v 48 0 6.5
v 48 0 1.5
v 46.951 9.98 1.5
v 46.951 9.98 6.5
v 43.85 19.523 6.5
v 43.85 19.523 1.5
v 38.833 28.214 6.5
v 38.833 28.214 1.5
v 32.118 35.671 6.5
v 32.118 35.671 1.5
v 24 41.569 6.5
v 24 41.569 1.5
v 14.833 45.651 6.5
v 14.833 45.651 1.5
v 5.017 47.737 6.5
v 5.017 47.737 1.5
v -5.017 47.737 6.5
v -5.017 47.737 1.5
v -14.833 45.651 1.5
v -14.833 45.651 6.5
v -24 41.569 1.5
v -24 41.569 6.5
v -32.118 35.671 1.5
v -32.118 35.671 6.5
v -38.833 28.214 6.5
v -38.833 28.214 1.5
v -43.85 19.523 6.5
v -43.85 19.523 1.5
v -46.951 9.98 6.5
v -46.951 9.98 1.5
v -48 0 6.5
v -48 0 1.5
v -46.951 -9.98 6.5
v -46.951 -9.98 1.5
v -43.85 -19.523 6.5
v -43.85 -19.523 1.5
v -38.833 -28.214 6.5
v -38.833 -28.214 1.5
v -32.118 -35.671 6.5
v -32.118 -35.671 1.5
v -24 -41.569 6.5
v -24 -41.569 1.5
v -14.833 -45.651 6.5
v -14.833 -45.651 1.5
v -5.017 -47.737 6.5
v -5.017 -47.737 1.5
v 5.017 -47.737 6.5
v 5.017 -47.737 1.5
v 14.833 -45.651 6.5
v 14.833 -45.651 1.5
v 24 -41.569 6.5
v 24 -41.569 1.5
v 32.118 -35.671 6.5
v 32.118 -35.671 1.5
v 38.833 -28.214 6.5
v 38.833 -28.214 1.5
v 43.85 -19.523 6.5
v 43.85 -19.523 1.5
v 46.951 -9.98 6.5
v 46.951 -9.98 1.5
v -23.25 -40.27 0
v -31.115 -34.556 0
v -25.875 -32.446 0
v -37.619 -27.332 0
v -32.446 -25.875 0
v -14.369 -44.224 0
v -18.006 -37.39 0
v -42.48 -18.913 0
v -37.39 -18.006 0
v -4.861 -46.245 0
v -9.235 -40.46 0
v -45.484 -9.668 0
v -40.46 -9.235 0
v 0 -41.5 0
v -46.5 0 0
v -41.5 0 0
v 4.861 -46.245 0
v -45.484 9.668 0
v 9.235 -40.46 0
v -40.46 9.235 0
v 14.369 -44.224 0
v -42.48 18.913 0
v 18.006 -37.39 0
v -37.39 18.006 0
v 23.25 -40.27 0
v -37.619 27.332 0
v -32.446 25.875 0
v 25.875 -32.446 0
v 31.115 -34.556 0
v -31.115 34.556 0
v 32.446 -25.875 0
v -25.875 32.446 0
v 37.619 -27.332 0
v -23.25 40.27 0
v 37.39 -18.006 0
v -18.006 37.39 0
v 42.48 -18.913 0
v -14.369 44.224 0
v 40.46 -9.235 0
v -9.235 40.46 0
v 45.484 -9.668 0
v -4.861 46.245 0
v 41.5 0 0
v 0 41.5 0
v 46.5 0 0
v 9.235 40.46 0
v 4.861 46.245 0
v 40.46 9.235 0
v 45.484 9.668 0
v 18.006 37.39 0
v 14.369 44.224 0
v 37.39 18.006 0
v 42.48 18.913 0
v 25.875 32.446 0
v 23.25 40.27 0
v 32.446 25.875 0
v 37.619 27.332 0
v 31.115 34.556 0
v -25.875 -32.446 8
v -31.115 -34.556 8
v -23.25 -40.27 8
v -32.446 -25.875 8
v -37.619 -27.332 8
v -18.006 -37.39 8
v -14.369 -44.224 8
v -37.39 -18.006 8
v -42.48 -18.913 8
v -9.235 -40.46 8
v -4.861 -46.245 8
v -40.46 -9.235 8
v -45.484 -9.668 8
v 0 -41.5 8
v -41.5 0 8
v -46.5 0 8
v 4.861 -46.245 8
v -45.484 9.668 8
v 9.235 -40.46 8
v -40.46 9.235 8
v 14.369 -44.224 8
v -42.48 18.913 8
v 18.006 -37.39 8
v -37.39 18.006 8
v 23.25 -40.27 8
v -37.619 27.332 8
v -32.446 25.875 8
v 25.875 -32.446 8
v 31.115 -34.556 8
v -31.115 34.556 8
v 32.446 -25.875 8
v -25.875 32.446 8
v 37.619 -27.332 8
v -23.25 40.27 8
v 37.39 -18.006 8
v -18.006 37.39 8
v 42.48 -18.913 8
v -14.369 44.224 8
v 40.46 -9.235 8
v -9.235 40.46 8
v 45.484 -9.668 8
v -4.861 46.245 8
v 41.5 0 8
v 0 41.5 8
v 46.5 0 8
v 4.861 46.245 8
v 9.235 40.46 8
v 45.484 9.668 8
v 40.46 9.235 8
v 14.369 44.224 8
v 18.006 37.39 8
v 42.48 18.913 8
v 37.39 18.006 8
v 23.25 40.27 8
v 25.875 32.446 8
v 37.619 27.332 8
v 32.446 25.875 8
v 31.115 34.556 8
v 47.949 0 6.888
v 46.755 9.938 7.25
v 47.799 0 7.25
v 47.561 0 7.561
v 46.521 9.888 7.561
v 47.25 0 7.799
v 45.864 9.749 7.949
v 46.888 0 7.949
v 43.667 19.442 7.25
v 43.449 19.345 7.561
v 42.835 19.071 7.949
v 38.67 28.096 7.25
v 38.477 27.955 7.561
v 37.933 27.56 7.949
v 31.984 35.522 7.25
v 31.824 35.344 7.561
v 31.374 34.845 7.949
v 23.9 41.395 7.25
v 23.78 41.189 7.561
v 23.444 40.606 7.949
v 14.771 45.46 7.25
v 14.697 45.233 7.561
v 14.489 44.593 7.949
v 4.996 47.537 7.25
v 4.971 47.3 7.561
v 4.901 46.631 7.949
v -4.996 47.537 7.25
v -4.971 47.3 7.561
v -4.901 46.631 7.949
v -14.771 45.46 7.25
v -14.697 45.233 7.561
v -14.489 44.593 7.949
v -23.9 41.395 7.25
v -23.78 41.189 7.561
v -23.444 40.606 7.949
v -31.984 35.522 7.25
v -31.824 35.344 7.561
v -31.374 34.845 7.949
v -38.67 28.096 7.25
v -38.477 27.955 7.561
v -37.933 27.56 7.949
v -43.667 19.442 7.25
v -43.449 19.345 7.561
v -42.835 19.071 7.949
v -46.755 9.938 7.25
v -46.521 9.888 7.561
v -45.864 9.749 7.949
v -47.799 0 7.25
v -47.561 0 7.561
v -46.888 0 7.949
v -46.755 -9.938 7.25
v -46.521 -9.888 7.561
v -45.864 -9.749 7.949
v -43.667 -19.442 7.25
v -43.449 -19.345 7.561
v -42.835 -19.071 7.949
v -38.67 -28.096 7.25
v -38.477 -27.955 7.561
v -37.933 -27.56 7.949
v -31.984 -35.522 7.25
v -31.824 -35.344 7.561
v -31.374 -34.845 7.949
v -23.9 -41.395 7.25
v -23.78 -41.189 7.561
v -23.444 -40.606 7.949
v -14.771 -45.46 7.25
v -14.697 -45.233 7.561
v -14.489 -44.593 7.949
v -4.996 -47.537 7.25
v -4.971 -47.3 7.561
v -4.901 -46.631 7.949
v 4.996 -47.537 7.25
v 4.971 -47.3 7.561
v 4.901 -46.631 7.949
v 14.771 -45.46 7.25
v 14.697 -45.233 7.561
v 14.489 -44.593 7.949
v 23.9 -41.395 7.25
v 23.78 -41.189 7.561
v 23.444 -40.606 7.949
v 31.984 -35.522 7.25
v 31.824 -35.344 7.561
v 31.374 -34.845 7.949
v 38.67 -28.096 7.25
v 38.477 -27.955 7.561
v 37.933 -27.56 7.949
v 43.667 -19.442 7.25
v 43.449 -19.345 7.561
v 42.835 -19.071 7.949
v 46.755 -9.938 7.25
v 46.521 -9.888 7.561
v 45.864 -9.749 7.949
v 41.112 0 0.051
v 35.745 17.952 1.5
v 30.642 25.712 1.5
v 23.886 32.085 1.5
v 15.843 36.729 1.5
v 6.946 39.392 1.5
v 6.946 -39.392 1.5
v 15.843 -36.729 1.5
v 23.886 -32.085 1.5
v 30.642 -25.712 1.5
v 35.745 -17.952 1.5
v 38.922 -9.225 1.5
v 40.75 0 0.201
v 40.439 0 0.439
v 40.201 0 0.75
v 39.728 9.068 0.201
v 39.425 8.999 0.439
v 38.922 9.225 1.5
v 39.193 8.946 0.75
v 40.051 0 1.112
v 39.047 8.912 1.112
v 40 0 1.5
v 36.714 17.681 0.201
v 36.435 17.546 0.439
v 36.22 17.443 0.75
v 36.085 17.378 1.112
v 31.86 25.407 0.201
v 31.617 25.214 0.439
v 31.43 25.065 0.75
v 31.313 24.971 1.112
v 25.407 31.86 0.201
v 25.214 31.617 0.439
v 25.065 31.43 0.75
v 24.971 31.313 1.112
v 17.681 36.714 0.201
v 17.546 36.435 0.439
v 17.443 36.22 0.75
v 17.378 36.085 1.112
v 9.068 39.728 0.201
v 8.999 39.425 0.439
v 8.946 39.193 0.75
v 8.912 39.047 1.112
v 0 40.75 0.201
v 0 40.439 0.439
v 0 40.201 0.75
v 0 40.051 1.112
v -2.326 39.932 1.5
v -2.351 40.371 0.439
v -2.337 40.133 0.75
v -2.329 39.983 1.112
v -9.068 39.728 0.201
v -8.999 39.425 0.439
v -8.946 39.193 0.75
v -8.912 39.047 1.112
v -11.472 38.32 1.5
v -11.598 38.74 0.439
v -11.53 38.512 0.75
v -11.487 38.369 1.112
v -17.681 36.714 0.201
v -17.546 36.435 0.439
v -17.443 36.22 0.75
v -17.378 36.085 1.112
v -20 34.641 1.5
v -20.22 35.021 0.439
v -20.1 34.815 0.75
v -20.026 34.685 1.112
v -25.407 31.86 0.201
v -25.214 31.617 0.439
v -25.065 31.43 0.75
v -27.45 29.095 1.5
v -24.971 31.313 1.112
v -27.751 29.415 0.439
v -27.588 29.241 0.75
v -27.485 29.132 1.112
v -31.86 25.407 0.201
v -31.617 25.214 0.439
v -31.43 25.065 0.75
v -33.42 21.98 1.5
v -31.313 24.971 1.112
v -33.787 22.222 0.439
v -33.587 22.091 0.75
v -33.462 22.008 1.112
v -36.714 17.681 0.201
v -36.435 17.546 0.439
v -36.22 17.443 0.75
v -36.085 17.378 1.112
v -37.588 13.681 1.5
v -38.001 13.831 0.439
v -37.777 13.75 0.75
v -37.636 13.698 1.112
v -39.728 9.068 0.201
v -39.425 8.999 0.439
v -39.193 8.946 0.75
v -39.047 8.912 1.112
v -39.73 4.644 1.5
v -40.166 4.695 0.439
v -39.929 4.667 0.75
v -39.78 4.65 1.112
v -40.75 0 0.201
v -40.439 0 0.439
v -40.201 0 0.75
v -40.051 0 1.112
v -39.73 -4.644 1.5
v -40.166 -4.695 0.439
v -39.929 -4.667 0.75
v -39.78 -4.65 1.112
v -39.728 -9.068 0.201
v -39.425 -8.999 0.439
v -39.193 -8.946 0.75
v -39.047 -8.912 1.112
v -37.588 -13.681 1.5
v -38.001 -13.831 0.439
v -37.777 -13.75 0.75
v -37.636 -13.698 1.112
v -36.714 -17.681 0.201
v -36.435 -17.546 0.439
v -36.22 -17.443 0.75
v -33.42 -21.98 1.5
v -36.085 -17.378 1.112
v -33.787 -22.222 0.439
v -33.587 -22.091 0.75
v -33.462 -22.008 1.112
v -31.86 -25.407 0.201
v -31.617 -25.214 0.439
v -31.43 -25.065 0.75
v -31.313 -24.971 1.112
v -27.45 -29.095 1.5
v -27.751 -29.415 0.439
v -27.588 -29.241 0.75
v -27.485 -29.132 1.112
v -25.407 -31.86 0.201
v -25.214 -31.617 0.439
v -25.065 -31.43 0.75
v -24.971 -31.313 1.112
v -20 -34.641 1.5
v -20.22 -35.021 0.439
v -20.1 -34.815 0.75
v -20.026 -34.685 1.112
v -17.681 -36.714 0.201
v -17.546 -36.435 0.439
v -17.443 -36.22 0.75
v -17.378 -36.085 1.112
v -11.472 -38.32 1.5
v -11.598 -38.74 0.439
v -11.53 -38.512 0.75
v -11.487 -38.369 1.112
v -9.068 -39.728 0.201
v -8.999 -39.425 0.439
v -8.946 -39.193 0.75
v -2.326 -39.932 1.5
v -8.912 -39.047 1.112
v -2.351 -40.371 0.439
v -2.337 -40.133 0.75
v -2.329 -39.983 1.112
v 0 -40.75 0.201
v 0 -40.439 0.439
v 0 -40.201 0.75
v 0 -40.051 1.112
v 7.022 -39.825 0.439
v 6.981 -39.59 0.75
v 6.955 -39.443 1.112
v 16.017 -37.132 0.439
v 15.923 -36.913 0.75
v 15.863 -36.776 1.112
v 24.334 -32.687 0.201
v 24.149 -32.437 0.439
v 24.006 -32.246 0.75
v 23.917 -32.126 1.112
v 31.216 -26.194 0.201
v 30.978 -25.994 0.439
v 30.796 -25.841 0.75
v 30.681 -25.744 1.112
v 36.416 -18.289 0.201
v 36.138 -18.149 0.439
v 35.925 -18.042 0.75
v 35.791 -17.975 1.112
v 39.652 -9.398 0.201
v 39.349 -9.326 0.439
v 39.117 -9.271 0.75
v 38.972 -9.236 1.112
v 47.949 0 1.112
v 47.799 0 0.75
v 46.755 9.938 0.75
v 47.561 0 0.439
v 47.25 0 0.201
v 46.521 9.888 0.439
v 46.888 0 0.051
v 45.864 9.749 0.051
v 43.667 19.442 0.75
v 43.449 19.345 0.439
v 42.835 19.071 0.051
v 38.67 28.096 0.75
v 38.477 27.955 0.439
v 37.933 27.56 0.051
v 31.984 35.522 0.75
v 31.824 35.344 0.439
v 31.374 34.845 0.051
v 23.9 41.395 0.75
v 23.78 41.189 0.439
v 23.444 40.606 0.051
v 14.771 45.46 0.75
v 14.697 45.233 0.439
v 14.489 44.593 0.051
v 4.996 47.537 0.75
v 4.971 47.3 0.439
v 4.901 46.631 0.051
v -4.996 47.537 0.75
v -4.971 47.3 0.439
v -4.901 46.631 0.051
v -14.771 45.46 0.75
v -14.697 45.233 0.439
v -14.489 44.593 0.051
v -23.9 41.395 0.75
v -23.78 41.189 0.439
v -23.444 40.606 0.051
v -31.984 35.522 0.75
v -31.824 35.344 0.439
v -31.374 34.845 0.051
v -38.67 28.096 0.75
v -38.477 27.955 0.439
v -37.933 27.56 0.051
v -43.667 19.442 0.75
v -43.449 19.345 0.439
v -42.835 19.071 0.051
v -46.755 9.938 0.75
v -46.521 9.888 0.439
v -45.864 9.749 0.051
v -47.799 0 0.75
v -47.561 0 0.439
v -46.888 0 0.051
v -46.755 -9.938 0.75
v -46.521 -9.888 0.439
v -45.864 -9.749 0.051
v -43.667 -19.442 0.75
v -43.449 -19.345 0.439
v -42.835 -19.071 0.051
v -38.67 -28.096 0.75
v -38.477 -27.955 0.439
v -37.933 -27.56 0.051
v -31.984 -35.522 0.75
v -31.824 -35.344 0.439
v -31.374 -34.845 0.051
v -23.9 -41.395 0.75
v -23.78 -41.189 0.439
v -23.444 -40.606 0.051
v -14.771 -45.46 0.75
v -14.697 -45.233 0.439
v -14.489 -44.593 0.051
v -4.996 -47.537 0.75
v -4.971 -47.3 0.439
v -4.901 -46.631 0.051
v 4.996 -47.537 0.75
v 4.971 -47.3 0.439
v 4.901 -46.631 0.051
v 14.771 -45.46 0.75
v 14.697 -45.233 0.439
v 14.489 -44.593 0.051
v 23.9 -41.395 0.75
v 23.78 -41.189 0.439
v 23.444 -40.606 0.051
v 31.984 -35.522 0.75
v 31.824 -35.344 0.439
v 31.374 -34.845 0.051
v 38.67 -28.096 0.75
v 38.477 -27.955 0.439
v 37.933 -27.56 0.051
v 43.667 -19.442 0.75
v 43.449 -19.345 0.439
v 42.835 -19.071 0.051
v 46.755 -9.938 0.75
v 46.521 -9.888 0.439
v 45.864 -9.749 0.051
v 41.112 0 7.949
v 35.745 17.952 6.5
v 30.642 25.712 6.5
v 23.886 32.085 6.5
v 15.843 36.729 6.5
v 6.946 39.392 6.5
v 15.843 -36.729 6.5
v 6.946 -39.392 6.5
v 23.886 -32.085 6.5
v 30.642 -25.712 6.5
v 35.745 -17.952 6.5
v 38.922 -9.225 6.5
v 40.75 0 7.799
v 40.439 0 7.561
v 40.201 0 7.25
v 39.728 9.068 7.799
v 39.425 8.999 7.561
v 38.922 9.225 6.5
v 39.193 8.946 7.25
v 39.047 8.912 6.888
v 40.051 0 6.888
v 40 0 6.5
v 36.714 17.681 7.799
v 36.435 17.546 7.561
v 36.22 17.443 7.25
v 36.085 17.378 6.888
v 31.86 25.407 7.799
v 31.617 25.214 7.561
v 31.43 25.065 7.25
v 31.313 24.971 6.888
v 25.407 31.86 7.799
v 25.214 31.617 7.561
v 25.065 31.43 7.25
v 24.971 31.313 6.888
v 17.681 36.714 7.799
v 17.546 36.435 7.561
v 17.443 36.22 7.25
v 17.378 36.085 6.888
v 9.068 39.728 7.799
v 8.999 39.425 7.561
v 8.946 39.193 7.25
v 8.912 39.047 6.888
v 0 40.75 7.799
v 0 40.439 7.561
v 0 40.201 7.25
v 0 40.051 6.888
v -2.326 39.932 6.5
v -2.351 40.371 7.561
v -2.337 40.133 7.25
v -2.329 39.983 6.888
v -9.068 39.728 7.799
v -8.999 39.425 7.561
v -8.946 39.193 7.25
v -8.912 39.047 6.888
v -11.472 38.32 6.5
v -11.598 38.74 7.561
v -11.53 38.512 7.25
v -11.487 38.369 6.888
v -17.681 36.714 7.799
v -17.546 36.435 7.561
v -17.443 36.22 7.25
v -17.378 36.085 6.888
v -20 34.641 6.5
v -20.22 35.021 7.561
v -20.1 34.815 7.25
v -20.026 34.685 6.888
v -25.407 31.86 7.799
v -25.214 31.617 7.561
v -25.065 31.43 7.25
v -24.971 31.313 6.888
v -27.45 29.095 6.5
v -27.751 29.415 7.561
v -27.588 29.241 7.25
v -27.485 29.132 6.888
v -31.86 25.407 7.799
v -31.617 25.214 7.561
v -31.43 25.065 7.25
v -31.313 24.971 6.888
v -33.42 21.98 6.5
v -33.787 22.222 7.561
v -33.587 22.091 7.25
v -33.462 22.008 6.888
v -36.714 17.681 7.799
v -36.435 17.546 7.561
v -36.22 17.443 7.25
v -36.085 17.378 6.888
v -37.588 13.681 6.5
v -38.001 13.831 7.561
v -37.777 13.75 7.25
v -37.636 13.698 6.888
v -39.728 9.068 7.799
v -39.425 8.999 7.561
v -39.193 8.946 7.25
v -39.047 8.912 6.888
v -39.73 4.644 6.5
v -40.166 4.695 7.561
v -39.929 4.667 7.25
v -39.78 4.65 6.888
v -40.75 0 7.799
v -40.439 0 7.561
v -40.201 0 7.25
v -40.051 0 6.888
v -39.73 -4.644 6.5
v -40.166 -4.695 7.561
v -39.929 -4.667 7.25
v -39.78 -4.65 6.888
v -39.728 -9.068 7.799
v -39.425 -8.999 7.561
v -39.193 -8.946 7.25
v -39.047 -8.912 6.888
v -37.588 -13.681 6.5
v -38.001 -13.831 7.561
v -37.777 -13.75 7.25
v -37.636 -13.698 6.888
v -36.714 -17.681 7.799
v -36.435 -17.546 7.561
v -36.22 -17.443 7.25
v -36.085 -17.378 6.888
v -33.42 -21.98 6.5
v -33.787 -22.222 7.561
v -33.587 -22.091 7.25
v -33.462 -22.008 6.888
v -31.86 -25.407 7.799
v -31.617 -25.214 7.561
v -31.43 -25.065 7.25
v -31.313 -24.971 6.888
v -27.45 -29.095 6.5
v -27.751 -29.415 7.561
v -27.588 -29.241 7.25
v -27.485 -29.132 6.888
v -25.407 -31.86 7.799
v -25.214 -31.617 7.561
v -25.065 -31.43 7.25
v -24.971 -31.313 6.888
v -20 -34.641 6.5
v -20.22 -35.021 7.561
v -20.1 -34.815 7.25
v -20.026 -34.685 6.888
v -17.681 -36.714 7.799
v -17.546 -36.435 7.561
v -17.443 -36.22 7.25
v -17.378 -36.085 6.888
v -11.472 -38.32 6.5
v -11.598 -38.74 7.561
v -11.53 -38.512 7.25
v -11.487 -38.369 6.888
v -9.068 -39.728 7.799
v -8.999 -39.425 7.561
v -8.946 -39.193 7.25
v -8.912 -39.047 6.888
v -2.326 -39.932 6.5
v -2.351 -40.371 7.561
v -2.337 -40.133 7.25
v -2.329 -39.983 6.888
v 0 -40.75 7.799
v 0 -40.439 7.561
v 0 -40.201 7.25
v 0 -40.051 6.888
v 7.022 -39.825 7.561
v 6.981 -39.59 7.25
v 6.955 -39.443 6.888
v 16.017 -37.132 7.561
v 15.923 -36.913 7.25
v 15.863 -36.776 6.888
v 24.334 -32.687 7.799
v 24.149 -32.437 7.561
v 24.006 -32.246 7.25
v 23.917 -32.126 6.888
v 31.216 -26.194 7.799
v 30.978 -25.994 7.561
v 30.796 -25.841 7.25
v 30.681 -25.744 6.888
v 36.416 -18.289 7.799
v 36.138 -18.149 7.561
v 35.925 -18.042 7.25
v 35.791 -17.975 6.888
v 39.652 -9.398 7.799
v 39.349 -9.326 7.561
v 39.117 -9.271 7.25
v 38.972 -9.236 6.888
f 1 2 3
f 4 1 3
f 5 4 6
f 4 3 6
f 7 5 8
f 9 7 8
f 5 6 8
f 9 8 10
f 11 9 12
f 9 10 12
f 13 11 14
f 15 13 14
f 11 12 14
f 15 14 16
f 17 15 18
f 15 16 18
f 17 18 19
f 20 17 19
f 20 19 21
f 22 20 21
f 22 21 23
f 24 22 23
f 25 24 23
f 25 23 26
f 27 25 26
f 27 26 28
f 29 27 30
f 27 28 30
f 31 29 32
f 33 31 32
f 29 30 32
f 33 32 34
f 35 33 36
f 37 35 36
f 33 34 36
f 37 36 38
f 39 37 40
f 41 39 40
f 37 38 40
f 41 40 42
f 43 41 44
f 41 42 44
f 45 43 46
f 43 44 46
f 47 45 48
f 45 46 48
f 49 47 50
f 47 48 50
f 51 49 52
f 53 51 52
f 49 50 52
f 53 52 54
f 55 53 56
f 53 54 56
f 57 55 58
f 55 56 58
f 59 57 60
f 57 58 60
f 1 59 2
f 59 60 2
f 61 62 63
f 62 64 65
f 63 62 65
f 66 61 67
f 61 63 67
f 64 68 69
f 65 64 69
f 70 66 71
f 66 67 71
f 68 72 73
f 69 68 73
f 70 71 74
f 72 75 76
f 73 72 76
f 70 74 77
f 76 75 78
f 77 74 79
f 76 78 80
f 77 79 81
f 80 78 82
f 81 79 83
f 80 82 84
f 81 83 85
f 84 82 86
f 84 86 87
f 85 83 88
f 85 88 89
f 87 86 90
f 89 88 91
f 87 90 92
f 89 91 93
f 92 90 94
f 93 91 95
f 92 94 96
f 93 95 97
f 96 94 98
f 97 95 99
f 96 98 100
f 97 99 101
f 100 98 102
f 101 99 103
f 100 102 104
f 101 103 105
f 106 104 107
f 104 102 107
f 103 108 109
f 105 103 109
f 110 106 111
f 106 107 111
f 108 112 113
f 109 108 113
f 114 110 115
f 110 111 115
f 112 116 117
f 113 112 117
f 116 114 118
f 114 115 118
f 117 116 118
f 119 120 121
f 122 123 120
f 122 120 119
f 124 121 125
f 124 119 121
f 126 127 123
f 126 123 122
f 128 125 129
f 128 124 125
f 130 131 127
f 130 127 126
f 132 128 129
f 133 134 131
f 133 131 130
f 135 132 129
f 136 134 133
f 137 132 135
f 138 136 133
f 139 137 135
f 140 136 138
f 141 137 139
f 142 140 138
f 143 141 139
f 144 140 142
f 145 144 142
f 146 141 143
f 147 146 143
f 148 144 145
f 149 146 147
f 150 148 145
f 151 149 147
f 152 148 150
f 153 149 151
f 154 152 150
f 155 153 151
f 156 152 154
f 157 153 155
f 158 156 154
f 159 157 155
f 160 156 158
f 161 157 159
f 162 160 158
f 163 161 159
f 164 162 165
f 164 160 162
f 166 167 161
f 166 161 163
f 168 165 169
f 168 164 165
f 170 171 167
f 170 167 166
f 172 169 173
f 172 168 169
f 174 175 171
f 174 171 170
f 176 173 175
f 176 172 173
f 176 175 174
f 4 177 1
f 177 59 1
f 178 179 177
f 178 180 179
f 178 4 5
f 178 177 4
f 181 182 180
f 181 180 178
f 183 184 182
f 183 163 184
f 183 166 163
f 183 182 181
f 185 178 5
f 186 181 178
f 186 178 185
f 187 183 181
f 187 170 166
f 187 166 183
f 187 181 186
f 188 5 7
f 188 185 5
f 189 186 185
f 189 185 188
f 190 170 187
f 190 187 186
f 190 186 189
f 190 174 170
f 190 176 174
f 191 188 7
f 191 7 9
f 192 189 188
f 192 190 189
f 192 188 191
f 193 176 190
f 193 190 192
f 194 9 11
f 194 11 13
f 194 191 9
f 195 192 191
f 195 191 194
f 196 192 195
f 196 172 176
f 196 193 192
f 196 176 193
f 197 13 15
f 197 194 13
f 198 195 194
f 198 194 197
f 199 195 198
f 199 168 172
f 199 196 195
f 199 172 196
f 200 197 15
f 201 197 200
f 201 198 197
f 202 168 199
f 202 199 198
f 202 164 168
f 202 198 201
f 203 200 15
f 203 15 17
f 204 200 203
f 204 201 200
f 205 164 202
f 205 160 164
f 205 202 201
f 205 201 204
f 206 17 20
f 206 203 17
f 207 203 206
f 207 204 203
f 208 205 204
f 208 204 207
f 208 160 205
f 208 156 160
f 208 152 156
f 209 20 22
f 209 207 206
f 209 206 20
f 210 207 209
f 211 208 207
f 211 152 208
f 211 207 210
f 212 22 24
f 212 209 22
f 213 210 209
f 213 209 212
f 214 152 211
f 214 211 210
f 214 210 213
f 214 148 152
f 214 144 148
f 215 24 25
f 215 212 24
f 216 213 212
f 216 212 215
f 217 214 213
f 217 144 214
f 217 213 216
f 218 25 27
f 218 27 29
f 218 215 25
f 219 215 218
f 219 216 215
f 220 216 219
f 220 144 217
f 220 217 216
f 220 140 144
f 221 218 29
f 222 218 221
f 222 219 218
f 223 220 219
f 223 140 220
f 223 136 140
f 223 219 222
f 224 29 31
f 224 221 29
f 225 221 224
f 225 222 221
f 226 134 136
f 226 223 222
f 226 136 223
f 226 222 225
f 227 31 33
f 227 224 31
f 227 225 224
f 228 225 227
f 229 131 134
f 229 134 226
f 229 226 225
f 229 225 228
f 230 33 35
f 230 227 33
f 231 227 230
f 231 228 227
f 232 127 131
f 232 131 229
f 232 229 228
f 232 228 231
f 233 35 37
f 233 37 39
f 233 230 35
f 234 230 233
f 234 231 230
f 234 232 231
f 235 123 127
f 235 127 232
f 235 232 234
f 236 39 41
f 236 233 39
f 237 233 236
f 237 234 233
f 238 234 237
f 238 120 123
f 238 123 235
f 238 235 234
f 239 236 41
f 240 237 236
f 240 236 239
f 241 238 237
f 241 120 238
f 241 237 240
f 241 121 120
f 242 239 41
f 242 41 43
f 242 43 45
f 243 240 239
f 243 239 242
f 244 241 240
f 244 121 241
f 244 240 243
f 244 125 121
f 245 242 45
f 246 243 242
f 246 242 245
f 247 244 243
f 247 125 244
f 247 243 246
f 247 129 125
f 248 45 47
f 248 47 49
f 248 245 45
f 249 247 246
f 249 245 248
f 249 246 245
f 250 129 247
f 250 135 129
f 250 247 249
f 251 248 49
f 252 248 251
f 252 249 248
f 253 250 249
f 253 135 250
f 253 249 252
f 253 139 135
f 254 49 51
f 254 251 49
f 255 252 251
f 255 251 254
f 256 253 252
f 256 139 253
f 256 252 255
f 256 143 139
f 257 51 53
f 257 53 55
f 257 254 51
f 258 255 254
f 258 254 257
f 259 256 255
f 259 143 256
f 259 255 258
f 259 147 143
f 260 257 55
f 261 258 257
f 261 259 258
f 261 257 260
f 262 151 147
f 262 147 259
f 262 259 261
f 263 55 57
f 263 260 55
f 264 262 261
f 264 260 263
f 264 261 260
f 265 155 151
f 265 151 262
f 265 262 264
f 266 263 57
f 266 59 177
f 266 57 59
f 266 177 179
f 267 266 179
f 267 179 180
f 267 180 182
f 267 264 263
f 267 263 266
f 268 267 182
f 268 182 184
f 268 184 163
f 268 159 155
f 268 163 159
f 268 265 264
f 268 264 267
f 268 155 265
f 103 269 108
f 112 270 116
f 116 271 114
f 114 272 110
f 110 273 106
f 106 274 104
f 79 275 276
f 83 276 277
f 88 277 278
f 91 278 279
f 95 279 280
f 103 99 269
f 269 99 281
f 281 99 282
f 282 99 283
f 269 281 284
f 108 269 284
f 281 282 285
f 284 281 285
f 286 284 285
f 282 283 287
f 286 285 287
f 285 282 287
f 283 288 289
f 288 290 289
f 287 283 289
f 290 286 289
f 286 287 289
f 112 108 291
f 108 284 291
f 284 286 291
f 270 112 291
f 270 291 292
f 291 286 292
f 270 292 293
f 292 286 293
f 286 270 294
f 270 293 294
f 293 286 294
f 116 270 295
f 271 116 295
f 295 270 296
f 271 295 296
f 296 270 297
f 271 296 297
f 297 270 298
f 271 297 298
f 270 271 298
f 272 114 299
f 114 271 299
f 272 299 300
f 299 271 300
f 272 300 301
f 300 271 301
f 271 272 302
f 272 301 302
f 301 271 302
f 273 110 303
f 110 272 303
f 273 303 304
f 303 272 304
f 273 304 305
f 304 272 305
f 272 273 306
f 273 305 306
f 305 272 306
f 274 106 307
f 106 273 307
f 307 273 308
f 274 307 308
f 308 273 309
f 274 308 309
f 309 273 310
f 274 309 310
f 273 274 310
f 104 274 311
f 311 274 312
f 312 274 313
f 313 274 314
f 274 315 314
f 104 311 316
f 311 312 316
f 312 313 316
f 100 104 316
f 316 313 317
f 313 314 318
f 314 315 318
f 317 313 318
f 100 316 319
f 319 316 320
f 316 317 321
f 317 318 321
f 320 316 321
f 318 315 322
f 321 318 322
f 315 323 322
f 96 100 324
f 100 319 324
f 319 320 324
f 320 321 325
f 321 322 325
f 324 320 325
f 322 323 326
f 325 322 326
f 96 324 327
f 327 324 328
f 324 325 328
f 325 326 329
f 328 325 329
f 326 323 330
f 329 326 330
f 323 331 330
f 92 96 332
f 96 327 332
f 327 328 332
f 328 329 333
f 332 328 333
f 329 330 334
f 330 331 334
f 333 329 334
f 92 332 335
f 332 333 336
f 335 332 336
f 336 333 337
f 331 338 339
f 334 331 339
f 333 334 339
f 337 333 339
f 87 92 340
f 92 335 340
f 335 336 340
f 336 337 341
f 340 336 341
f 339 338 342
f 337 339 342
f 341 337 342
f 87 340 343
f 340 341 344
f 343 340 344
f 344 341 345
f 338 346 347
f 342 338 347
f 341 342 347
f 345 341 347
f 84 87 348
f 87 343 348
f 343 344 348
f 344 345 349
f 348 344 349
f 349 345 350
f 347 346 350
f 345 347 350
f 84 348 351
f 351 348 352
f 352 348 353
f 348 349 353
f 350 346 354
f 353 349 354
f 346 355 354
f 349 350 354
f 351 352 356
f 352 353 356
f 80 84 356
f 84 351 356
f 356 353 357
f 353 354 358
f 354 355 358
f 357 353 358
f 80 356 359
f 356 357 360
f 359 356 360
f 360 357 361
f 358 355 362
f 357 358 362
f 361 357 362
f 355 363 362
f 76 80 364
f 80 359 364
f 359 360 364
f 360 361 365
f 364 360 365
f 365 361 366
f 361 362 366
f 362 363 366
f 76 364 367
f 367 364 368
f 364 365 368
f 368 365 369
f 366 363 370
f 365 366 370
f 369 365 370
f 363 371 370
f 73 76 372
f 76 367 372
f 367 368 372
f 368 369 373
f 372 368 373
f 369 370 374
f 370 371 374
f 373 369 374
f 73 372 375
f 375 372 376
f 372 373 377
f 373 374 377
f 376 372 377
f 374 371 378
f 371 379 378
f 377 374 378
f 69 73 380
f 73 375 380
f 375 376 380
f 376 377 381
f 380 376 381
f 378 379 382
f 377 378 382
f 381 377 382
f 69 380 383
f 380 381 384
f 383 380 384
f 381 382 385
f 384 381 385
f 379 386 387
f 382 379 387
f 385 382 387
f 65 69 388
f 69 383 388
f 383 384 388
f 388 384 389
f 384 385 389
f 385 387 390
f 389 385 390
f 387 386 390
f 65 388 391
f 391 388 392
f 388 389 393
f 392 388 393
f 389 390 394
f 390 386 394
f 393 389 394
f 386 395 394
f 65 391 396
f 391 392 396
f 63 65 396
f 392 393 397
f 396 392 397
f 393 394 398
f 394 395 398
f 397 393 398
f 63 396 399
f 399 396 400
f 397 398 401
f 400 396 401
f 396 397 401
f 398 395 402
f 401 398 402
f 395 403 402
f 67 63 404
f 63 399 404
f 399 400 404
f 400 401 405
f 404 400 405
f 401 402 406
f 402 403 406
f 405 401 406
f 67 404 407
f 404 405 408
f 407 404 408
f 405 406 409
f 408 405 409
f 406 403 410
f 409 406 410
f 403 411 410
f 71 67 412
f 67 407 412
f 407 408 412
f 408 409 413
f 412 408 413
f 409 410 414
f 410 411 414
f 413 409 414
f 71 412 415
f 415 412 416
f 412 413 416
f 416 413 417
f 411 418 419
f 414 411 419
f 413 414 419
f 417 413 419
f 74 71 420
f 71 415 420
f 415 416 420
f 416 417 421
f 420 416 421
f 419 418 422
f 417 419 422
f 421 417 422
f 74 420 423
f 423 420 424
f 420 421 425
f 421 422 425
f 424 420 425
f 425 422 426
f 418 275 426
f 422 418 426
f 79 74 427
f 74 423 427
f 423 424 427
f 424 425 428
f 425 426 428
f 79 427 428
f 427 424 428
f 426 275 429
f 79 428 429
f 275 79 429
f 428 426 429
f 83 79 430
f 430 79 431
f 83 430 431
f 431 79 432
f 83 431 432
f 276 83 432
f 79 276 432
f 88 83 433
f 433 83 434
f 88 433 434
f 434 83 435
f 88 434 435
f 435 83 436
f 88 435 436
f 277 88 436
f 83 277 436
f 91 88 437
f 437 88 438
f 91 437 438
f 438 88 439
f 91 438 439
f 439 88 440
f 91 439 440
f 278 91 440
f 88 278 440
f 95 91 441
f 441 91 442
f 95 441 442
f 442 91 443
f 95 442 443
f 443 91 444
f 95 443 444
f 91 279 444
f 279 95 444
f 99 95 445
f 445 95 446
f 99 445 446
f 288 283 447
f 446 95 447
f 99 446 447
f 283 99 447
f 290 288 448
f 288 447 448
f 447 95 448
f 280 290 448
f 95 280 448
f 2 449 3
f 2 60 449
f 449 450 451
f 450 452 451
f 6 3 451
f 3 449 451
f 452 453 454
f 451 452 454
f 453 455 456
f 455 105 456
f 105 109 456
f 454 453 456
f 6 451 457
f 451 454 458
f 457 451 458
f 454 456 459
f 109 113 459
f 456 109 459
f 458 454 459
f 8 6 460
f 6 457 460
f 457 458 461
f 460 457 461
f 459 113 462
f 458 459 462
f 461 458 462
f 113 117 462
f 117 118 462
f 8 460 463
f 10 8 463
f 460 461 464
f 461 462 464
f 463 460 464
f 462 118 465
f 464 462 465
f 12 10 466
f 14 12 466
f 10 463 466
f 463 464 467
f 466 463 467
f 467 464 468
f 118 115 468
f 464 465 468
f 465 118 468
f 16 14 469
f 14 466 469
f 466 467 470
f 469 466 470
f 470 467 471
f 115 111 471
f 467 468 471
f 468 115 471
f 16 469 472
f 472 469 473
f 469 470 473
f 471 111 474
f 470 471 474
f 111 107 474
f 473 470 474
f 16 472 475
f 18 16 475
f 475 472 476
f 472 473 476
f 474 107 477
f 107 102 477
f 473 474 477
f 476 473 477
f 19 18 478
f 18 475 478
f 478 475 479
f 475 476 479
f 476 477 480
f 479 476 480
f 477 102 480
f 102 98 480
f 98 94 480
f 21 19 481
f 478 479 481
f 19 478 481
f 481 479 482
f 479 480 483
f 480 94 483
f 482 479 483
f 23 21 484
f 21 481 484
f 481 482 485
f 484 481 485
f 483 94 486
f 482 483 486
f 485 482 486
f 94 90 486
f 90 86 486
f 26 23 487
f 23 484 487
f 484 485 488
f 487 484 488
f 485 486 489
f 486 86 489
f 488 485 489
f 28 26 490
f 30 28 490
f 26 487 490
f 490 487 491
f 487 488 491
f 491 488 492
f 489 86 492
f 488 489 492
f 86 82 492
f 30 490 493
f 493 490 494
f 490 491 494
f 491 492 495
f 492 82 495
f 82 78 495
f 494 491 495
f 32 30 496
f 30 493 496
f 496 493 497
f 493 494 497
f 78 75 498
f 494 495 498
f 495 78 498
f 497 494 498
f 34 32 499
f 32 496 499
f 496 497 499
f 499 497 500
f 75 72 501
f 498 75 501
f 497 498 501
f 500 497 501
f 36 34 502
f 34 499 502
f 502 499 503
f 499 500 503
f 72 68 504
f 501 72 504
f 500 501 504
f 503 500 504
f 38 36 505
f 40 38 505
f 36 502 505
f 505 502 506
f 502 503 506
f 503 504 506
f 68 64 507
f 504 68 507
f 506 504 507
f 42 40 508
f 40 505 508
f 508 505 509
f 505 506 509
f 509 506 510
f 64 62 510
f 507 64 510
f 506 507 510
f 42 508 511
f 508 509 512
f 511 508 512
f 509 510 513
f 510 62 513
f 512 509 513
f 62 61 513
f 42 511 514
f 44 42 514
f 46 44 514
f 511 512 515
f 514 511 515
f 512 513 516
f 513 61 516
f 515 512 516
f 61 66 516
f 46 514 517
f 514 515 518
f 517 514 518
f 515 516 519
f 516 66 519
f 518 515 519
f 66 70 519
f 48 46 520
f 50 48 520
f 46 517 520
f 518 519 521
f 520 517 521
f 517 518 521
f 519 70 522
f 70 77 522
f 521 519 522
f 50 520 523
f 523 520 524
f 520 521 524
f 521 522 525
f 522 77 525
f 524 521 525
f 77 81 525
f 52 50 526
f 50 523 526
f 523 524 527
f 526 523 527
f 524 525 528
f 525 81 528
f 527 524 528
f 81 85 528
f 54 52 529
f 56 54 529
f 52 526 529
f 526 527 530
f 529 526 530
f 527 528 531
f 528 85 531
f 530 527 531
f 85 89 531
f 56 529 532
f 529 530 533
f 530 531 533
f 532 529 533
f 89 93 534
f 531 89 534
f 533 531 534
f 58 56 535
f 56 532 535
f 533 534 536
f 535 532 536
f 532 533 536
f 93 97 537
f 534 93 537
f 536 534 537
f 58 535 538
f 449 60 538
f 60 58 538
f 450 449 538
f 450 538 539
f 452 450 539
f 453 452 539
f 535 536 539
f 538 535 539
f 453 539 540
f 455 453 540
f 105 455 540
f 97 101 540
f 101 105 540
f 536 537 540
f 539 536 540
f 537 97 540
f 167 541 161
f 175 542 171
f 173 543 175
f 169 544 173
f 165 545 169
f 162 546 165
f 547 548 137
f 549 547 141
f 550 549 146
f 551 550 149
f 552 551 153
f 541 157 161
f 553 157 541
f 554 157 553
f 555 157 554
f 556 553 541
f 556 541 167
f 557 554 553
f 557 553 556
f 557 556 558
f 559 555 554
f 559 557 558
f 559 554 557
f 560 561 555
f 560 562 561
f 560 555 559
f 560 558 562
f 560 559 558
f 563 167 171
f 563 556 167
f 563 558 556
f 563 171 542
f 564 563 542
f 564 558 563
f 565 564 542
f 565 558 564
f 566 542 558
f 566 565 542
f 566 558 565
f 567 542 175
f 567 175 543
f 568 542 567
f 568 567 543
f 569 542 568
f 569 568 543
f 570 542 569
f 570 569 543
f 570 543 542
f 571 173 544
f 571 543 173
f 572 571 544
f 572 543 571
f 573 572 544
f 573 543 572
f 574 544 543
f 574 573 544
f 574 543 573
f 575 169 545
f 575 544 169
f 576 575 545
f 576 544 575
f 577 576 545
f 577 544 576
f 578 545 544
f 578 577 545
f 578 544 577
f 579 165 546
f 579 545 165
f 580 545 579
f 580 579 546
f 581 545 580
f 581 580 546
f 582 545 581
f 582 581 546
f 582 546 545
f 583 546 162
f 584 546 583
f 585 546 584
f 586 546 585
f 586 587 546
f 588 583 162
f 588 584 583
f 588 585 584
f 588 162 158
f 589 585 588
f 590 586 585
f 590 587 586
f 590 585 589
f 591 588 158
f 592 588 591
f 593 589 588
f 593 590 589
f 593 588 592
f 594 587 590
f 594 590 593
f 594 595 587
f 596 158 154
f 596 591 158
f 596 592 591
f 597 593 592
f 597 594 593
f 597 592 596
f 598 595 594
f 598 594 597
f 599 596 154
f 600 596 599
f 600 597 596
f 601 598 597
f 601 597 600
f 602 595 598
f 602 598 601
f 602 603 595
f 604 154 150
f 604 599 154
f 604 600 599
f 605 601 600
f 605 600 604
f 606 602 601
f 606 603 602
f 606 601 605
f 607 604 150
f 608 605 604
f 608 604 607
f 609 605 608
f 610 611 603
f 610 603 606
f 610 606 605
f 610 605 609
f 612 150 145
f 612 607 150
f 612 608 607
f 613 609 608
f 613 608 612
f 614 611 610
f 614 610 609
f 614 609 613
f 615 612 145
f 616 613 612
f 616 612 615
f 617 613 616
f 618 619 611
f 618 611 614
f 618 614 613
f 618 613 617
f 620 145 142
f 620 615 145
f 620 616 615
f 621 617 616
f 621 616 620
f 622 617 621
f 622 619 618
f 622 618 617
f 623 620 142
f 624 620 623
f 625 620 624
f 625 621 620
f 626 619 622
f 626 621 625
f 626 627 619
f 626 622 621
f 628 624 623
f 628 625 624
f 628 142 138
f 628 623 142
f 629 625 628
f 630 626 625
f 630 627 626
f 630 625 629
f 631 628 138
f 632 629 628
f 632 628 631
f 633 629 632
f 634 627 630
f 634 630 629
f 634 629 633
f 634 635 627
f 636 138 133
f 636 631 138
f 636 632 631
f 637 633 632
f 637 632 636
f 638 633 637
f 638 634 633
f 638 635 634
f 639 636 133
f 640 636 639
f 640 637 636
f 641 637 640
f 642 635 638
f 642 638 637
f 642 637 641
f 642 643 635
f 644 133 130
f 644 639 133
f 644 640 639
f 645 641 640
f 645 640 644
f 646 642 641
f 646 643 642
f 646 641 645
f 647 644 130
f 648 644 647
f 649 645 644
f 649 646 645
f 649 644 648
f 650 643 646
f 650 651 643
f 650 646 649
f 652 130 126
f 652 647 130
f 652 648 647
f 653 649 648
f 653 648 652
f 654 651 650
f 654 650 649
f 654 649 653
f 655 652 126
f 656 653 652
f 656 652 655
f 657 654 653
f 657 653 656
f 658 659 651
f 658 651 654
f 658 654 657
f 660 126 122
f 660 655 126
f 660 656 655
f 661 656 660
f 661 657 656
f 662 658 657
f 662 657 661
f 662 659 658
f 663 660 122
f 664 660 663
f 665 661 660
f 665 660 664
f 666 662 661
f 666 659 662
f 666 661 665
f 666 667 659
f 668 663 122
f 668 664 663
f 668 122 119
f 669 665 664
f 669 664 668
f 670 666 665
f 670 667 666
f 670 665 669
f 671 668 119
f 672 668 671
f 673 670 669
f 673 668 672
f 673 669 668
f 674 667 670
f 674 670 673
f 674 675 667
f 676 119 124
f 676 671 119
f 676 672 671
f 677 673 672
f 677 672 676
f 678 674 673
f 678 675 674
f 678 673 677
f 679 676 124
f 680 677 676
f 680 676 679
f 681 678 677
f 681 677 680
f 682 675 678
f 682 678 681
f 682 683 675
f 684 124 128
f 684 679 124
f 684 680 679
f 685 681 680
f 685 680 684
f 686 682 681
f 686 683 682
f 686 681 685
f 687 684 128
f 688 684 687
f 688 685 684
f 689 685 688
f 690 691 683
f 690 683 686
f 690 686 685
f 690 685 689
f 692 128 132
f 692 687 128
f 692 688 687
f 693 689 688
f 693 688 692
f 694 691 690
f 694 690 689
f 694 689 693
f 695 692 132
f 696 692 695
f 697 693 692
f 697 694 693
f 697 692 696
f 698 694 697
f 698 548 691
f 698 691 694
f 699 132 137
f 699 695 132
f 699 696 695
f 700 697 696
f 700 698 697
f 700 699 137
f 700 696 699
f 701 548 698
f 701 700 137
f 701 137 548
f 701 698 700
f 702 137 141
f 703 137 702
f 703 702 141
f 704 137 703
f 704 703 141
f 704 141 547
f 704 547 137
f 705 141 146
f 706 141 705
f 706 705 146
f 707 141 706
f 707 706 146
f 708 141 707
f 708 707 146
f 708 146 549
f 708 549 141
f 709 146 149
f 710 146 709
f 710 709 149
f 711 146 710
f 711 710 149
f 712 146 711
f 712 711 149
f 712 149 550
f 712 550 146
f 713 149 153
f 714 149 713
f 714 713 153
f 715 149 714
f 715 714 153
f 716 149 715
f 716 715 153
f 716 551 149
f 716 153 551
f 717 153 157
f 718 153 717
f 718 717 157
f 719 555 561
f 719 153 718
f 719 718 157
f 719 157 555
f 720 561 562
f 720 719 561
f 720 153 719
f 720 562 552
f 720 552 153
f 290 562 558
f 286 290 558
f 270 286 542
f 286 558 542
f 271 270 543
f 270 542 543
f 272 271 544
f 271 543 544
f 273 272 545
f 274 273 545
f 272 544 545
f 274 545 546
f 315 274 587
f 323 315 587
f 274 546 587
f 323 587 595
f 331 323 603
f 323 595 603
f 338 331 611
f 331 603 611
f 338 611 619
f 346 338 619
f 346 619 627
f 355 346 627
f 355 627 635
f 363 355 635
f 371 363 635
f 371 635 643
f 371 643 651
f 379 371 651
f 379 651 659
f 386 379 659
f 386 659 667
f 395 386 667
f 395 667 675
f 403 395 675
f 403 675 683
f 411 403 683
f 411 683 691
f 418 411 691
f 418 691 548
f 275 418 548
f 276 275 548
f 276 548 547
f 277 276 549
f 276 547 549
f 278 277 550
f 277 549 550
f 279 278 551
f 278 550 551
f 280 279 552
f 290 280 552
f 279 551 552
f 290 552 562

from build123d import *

# Parameters (mm, degrees)
SKETCH_1_R      = 48
SLEEVE_DEPTH    = 8
SKETCH_2_R      = 40
BORE_DEPTH      = 69.352029963
ROUNDED_EDGES_R = 1.5


with BuildPart() as part:
    # 草图1 → Sleeve (new body)
    with BuildSketch(Plane.XY):
        Circle(SKETCH_1_R)
    extrude(amount=SLEEVE_DEPTH)

    # 草图2 → Bore (cut, through all)
    with BuildSketch(Plane.XY.offset(8)):
        Circle(SKETCH_2_R)
    extrude(amount=-BORE_DEPTH, mode=Mode.SUBTRACT)

    # Rounded_edges
    rounded_edges_edges = [part.edges().sort_by_distance(p)[0] for p in [
        (-48, 0, 0),
        (-48, 0, 8),
        (-40, 0, 0),
        (-40, 0, 8),
    ]]
    fillet(rounded_edges_edges, radius=ROUNDED_EDGES_R)


solid = part.part
